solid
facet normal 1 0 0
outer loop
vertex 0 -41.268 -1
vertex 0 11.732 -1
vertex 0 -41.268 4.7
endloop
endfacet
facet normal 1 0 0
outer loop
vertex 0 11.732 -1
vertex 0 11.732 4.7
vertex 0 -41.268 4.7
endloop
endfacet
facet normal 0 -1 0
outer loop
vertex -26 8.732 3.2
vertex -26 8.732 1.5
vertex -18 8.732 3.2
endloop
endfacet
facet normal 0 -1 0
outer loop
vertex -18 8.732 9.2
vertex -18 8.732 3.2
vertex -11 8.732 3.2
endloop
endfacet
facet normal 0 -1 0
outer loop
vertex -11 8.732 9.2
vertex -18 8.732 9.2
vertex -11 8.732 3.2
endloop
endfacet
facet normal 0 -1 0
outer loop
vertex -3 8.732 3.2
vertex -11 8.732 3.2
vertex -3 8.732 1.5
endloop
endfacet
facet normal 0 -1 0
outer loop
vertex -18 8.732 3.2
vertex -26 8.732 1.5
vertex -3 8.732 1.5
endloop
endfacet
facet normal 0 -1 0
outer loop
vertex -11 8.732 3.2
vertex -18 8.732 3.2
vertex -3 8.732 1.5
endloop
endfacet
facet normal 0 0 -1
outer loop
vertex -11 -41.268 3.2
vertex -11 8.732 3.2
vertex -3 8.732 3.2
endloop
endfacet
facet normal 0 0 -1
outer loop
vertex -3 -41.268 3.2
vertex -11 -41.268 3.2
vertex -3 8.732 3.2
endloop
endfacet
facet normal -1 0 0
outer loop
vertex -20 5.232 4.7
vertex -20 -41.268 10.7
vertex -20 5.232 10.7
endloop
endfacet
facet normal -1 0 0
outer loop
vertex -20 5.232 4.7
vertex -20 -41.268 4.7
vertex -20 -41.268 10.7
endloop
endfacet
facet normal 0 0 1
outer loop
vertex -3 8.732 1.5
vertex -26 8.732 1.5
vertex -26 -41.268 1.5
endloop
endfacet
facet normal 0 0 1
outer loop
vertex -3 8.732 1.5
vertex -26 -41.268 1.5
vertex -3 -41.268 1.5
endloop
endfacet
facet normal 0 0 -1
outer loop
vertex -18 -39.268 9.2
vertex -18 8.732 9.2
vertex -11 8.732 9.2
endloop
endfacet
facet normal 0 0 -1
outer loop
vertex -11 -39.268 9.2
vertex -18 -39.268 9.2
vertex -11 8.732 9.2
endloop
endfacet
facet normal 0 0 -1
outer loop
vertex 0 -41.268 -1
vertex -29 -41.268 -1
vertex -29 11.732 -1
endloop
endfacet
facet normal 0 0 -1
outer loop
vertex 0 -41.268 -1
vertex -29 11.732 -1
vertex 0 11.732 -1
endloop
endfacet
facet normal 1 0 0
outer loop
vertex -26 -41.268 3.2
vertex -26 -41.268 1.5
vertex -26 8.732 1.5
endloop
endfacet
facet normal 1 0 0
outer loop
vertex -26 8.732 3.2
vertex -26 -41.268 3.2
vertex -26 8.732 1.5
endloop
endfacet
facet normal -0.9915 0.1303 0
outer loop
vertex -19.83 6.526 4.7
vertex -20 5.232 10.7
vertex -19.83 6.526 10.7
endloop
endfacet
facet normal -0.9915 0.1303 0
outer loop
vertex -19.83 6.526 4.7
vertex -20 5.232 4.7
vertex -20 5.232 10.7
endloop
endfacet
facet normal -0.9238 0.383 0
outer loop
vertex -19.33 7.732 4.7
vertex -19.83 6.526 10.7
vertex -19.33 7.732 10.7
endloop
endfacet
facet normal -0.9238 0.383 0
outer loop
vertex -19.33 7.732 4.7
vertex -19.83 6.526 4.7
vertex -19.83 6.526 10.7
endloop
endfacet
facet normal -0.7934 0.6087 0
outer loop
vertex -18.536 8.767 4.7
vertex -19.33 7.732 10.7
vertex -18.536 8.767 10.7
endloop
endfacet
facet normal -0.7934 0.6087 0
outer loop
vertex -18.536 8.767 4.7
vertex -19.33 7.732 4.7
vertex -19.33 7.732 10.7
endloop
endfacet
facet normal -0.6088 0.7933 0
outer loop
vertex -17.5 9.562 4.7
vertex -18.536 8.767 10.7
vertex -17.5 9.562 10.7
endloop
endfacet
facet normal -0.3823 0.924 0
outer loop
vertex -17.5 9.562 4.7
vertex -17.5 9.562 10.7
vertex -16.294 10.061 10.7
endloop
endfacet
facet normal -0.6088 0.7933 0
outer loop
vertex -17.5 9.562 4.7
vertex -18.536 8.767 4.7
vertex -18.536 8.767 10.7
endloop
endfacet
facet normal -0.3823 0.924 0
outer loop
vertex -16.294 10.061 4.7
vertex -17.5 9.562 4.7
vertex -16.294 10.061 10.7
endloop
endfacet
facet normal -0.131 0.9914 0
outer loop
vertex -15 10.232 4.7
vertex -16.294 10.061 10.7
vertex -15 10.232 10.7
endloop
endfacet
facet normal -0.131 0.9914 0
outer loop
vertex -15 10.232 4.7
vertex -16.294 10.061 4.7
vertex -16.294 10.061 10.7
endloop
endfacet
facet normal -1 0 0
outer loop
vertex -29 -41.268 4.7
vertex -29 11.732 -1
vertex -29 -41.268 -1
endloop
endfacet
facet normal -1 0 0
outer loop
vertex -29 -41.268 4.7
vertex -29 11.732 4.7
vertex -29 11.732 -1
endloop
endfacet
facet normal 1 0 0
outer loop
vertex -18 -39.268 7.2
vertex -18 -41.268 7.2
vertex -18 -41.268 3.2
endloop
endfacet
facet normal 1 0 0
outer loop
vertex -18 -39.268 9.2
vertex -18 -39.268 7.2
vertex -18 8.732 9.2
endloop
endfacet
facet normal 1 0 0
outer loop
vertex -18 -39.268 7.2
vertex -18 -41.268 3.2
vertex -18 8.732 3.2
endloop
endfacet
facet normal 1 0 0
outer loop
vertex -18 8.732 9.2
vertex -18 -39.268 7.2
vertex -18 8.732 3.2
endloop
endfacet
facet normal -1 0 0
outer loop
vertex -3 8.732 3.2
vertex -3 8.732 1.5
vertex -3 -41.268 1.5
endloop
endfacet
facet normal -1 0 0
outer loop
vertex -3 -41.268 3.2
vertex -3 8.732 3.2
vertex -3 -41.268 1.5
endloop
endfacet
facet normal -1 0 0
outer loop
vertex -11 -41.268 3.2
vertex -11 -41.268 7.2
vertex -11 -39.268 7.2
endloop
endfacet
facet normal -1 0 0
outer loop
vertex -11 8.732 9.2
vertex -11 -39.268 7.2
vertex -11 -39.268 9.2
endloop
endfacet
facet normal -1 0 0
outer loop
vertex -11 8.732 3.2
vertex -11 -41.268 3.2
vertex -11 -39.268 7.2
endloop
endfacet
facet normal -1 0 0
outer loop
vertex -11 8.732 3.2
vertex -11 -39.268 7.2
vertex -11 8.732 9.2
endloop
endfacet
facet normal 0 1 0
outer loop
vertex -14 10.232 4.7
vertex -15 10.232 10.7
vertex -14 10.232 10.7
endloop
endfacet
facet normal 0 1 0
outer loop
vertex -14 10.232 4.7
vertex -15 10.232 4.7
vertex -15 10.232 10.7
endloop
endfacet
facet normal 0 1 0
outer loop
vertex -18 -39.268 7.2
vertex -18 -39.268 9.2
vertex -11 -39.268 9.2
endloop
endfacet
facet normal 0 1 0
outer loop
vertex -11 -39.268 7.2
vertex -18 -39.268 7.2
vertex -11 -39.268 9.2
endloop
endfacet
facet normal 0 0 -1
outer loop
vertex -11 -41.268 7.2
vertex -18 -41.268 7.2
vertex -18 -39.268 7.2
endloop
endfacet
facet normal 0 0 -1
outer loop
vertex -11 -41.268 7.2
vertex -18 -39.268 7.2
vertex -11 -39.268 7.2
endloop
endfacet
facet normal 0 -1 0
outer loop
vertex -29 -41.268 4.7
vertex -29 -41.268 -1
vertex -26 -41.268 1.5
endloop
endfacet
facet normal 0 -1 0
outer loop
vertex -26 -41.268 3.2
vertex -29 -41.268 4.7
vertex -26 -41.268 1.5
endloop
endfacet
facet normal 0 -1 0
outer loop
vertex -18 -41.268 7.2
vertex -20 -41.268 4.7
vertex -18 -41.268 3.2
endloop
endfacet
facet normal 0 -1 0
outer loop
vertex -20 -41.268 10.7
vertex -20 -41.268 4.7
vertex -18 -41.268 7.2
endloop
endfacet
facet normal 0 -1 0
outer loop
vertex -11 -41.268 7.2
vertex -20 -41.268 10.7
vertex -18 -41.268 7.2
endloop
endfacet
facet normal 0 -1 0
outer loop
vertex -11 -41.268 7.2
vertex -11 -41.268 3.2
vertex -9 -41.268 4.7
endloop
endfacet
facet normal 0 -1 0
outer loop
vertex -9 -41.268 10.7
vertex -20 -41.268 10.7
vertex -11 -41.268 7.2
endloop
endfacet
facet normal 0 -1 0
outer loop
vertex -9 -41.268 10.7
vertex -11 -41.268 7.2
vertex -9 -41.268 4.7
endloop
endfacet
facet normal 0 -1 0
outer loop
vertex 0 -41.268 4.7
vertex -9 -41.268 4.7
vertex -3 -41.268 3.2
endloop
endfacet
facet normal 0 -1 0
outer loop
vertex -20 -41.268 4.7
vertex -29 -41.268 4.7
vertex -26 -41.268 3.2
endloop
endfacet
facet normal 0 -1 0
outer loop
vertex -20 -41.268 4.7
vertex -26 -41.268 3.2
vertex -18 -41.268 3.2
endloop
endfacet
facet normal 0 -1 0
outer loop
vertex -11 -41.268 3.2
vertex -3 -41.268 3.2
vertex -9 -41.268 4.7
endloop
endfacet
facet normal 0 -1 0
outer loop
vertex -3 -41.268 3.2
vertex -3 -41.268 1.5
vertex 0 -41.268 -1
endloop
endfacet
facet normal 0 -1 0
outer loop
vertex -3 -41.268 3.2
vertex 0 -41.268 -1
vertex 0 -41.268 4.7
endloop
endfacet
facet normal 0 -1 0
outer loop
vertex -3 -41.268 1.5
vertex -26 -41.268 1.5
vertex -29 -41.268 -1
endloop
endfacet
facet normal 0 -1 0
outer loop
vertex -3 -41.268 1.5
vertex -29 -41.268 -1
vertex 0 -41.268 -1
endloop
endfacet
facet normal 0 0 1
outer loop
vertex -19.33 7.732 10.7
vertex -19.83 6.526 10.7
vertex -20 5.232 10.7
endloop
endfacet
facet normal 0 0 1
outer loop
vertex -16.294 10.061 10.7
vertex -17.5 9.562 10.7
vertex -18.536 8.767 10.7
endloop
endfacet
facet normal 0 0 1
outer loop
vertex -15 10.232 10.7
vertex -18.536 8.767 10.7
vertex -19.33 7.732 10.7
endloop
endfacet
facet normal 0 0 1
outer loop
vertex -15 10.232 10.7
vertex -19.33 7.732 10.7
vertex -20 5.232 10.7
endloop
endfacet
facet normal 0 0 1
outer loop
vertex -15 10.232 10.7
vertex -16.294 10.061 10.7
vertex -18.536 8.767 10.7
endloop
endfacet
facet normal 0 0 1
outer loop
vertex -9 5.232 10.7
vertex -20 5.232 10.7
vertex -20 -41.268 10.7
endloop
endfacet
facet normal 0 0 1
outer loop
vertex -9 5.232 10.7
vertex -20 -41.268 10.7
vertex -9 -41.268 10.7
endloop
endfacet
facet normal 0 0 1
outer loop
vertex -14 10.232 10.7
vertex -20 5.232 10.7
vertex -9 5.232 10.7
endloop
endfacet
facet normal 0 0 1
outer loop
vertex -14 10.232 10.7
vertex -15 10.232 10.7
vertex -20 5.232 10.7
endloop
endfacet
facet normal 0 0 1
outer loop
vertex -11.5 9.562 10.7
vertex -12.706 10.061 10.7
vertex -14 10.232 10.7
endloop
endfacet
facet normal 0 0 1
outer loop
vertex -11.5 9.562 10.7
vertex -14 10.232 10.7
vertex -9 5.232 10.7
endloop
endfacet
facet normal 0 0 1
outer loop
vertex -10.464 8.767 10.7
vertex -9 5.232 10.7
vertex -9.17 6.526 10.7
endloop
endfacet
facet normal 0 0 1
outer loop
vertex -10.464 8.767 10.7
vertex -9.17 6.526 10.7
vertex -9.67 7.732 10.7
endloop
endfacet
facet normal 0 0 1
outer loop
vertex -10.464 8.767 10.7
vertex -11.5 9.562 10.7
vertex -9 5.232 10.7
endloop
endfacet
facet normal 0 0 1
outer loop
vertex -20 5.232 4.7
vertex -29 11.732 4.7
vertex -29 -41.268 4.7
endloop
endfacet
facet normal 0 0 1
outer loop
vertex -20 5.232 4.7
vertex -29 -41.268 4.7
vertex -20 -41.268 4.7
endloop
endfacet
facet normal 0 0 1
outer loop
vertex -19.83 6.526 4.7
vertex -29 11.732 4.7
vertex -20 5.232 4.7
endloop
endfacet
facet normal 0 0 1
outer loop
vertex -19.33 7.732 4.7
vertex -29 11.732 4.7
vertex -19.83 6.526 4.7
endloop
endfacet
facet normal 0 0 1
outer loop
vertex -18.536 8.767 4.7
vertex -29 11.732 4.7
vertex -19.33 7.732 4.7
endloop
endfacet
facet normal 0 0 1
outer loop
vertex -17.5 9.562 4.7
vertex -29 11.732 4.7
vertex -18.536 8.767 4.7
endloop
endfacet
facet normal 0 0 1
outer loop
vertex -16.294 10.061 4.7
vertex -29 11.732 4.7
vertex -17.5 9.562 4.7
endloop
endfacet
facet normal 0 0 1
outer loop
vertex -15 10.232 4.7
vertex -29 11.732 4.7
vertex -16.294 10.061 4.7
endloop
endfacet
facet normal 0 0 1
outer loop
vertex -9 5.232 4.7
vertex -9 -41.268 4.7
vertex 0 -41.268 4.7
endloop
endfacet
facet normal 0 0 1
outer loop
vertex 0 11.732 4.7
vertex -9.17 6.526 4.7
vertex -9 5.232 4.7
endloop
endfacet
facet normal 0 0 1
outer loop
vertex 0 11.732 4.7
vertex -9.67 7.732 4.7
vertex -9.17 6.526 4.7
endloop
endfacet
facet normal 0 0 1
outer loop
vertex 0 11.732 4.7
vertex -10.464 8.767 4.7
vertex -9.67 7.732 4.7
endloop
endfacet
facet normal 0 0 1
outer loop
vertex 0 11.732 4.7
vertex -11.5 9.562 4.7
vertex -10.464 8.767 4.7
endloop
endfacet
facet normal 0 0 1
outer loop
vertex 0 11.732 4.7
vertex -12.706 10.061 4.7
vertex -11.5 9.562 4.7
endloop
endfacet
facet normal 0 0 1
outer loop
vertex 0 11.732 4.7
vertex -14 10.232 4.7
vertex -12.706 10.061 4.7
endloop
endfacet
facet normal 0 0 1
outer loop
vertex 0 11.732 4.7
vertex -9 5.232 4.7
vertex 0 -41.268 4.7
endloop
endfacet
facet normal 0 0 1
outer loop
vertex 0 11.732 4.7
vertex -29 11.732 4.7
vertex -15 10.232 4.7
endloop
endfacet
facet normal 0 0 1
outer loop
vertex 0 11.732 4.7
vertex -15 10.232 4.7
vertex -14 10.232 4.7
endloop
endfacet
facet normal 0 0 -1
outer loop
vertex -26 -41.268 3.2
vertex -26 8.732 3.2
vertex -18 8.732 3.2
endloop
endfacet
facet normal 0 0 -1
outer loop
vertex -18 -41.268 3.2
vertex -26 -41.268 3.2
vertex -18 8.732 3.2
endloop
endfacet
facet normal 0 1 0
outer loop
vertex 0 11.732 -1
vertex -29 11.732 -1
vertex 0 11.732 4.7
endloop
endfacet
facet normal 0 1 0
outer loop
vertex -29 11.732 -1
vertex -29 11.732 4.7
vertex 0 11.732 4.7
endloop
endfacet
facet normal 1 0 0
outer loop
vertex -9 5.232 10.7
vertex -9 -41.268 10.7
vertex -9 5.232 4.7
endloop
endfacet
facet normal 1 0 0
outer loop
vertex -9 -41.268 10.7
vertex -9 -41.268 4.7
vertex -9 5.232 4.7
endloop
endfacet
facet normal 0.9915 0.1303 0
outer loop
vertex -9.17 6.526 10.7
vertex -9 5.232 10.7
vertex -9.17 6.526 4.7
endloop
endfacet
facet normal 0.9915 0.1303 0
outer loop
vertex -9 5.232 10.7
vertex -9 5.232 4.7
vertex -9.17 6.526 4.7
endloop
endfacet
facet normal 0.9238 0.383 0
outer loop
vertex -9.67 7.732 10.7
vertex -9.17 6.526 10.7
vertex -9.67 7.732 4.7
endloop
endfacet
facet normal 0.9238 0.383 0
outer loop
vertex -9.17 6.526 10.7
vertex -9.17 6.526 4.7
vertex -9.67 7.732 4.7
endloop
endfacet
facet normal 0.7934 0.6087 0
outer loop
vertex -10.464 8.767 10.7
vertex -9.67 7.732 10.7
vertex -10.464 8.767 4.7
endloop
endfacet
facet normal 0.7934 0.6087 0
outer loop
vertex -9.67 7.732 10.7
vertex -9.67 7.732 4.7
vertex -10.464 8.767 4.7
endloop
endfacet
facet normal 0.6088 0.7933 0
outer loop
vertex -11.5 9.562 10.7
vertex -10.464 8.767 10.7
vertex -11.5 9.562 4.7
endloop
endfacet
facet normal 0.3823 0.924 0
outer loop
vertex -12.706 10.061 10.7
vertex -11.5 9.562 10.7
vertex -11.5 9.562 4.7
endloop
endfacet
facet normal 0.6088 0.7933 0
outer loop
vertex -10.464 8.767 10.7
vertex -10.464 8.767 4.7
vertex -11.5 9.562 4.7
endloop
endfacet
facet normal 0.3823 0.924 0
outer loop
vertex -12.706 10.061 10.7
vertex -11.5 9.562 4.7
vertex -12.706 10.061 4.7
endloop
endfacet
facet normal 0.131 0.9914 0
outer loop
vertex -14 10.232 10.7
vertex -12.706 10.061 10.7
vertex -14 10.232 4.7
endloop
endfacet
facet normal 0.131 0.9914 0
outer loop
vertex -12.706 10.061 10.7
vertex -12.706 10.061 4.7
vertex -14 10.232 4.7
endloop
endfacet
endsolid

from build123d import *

# Parameters (mm, degrees)
F0_W      = 23
F0_H      = 50
F1_DEPTH  = 1.5
F2_DEPTH  = 3.2
F3_W      = 7
F3_H      = 3
F3_W_2    = 6
F3_H_2    = 50
F4_DEPTH  = 1.5
F3_W_3    = 2
F5_DEPTH  = 6
F6_W      = 11
F6_H      = 1.5
F7_DEPTH  = 4.5
F8_W      = 11
F8_H      = 51.5
F9_DEPTH  = 1.5
F10_R     = 5
F11_W     = 29
F11_H     = 53
F12_DEPTH = 1
F13_W     = 7
F13_H     = 2
F14_DEPTH = 2


with BuildPart() as f1:
    # F0 (on Top) → F1 (new body)
    with BuildSketch(Plane.XY):
        with Locations((-14.5, -16.2683480976)):
            Rectangle(F0_W, F0_H)
    extrude(amount=F1_DEPTH)

    # F0 (on Top) → F2 (join)
    with BuildSketch(Plane.XY):
        Polygon((-26, -41.2683480976), (-26, 8.7316519024), (-3, 8.7316519024), (-3, -41.2683480976), (0, -41.2683480976), (0, 11.7316519024), (-29, 11.7316519024), (-29, -41.2683480976), align=None)
    extrude(amount=F2_DEPTH)

    # F3 (on face) → F4 (join)
    with BuildSketch(Plane.XY.offset(3.2)):
        with Locations((-14.5, 10.2316519024)):
            Rectangle(F3_W, F3_H)
        with Locations((-23, -16.2683480976)):
            Rectangle(F3_W_2, F3_H_2)
        with Locations((-6, -16.2683480976)):
            Rectangle(F3_W_2, F3_H_2)
        Polygon((-18, 11.7316519024), (-29, 11.7316519024), (-29, -41.2683480976), (-26, -41.2683480976), (-26, 8.7316519024), (-20, 8.7316519024), (-18, 8.7316519024), align=None)
        Polygon((0, 11.7316519024), (-11, 11.7316519024), (-11, 8.7316519024), (-9, 8.7316519024), (-3, 8.7316519024), (-3, -41.2683480976), (0, -41.2683480976), align=None)
    extrude(amount=F4_DEPTH)

    # F3 (on face) → F5 (join)
    with BuildSketch(Plane.XY.offset(3.2)):
        with Locations((-10, -16.2683480976)):
            Rectangle(F3_W_3, F3_H_2)
        with Locations((-19, -16.2683480976)):
            Rectangle(F3_W_3, F3_H_2)
    extrude(amount=F5_DEPTH)

    # F6 (on face) → F7 (join)
    with BuildSketch(Plane.XY.offset(4.7)):
        with Locations((-14.5, 9.4816519024)):
            Rectangle(F6_W, F6_H)
    extrude(amount=F7_DEPTH)

    # F8 (on face) → F9 (join)
    with BuildSketch(Plane.XY.offset(9.2)):
        with Locations((-14.5, -15.5183480976)):
            Rectangle(F8_W, F8_H)
    extrude(amount=F9_DEPTH)

    # F10
    f10_edges = [f1.edges().sort_by_distance(p)[0] for p in [
        (-20, 10.231652, 7.7),
        (-9, 10.231652, 7.7),
    ]]
    fillet(f10_edges, radius=F10_R)

    # F11 (on face) → F12 (join)
    with BuildSketch(Plane(origin=(0, 0, 0), x_dir=(1, 0, 0), z_dir=(0, 0, -1))):
        with Locations((-14.5, 14.7683480976)):
            Rectangle(F11_W, F11_H)
    extrude(amount=F12_DEPTH)

    # F13 (on face) → F14 (join)
    with BuildSketch(Plane(origin=(0, 0, 9.2), x_dir=(1, 0, 0), z_dir=(0, 0, -1))):
        with Locations((-14.5, 40.2683480976)):
            Rectangle(F13_W, F13_H)
    extrude(amount=F14_DEPTH)


solid = f1.part
